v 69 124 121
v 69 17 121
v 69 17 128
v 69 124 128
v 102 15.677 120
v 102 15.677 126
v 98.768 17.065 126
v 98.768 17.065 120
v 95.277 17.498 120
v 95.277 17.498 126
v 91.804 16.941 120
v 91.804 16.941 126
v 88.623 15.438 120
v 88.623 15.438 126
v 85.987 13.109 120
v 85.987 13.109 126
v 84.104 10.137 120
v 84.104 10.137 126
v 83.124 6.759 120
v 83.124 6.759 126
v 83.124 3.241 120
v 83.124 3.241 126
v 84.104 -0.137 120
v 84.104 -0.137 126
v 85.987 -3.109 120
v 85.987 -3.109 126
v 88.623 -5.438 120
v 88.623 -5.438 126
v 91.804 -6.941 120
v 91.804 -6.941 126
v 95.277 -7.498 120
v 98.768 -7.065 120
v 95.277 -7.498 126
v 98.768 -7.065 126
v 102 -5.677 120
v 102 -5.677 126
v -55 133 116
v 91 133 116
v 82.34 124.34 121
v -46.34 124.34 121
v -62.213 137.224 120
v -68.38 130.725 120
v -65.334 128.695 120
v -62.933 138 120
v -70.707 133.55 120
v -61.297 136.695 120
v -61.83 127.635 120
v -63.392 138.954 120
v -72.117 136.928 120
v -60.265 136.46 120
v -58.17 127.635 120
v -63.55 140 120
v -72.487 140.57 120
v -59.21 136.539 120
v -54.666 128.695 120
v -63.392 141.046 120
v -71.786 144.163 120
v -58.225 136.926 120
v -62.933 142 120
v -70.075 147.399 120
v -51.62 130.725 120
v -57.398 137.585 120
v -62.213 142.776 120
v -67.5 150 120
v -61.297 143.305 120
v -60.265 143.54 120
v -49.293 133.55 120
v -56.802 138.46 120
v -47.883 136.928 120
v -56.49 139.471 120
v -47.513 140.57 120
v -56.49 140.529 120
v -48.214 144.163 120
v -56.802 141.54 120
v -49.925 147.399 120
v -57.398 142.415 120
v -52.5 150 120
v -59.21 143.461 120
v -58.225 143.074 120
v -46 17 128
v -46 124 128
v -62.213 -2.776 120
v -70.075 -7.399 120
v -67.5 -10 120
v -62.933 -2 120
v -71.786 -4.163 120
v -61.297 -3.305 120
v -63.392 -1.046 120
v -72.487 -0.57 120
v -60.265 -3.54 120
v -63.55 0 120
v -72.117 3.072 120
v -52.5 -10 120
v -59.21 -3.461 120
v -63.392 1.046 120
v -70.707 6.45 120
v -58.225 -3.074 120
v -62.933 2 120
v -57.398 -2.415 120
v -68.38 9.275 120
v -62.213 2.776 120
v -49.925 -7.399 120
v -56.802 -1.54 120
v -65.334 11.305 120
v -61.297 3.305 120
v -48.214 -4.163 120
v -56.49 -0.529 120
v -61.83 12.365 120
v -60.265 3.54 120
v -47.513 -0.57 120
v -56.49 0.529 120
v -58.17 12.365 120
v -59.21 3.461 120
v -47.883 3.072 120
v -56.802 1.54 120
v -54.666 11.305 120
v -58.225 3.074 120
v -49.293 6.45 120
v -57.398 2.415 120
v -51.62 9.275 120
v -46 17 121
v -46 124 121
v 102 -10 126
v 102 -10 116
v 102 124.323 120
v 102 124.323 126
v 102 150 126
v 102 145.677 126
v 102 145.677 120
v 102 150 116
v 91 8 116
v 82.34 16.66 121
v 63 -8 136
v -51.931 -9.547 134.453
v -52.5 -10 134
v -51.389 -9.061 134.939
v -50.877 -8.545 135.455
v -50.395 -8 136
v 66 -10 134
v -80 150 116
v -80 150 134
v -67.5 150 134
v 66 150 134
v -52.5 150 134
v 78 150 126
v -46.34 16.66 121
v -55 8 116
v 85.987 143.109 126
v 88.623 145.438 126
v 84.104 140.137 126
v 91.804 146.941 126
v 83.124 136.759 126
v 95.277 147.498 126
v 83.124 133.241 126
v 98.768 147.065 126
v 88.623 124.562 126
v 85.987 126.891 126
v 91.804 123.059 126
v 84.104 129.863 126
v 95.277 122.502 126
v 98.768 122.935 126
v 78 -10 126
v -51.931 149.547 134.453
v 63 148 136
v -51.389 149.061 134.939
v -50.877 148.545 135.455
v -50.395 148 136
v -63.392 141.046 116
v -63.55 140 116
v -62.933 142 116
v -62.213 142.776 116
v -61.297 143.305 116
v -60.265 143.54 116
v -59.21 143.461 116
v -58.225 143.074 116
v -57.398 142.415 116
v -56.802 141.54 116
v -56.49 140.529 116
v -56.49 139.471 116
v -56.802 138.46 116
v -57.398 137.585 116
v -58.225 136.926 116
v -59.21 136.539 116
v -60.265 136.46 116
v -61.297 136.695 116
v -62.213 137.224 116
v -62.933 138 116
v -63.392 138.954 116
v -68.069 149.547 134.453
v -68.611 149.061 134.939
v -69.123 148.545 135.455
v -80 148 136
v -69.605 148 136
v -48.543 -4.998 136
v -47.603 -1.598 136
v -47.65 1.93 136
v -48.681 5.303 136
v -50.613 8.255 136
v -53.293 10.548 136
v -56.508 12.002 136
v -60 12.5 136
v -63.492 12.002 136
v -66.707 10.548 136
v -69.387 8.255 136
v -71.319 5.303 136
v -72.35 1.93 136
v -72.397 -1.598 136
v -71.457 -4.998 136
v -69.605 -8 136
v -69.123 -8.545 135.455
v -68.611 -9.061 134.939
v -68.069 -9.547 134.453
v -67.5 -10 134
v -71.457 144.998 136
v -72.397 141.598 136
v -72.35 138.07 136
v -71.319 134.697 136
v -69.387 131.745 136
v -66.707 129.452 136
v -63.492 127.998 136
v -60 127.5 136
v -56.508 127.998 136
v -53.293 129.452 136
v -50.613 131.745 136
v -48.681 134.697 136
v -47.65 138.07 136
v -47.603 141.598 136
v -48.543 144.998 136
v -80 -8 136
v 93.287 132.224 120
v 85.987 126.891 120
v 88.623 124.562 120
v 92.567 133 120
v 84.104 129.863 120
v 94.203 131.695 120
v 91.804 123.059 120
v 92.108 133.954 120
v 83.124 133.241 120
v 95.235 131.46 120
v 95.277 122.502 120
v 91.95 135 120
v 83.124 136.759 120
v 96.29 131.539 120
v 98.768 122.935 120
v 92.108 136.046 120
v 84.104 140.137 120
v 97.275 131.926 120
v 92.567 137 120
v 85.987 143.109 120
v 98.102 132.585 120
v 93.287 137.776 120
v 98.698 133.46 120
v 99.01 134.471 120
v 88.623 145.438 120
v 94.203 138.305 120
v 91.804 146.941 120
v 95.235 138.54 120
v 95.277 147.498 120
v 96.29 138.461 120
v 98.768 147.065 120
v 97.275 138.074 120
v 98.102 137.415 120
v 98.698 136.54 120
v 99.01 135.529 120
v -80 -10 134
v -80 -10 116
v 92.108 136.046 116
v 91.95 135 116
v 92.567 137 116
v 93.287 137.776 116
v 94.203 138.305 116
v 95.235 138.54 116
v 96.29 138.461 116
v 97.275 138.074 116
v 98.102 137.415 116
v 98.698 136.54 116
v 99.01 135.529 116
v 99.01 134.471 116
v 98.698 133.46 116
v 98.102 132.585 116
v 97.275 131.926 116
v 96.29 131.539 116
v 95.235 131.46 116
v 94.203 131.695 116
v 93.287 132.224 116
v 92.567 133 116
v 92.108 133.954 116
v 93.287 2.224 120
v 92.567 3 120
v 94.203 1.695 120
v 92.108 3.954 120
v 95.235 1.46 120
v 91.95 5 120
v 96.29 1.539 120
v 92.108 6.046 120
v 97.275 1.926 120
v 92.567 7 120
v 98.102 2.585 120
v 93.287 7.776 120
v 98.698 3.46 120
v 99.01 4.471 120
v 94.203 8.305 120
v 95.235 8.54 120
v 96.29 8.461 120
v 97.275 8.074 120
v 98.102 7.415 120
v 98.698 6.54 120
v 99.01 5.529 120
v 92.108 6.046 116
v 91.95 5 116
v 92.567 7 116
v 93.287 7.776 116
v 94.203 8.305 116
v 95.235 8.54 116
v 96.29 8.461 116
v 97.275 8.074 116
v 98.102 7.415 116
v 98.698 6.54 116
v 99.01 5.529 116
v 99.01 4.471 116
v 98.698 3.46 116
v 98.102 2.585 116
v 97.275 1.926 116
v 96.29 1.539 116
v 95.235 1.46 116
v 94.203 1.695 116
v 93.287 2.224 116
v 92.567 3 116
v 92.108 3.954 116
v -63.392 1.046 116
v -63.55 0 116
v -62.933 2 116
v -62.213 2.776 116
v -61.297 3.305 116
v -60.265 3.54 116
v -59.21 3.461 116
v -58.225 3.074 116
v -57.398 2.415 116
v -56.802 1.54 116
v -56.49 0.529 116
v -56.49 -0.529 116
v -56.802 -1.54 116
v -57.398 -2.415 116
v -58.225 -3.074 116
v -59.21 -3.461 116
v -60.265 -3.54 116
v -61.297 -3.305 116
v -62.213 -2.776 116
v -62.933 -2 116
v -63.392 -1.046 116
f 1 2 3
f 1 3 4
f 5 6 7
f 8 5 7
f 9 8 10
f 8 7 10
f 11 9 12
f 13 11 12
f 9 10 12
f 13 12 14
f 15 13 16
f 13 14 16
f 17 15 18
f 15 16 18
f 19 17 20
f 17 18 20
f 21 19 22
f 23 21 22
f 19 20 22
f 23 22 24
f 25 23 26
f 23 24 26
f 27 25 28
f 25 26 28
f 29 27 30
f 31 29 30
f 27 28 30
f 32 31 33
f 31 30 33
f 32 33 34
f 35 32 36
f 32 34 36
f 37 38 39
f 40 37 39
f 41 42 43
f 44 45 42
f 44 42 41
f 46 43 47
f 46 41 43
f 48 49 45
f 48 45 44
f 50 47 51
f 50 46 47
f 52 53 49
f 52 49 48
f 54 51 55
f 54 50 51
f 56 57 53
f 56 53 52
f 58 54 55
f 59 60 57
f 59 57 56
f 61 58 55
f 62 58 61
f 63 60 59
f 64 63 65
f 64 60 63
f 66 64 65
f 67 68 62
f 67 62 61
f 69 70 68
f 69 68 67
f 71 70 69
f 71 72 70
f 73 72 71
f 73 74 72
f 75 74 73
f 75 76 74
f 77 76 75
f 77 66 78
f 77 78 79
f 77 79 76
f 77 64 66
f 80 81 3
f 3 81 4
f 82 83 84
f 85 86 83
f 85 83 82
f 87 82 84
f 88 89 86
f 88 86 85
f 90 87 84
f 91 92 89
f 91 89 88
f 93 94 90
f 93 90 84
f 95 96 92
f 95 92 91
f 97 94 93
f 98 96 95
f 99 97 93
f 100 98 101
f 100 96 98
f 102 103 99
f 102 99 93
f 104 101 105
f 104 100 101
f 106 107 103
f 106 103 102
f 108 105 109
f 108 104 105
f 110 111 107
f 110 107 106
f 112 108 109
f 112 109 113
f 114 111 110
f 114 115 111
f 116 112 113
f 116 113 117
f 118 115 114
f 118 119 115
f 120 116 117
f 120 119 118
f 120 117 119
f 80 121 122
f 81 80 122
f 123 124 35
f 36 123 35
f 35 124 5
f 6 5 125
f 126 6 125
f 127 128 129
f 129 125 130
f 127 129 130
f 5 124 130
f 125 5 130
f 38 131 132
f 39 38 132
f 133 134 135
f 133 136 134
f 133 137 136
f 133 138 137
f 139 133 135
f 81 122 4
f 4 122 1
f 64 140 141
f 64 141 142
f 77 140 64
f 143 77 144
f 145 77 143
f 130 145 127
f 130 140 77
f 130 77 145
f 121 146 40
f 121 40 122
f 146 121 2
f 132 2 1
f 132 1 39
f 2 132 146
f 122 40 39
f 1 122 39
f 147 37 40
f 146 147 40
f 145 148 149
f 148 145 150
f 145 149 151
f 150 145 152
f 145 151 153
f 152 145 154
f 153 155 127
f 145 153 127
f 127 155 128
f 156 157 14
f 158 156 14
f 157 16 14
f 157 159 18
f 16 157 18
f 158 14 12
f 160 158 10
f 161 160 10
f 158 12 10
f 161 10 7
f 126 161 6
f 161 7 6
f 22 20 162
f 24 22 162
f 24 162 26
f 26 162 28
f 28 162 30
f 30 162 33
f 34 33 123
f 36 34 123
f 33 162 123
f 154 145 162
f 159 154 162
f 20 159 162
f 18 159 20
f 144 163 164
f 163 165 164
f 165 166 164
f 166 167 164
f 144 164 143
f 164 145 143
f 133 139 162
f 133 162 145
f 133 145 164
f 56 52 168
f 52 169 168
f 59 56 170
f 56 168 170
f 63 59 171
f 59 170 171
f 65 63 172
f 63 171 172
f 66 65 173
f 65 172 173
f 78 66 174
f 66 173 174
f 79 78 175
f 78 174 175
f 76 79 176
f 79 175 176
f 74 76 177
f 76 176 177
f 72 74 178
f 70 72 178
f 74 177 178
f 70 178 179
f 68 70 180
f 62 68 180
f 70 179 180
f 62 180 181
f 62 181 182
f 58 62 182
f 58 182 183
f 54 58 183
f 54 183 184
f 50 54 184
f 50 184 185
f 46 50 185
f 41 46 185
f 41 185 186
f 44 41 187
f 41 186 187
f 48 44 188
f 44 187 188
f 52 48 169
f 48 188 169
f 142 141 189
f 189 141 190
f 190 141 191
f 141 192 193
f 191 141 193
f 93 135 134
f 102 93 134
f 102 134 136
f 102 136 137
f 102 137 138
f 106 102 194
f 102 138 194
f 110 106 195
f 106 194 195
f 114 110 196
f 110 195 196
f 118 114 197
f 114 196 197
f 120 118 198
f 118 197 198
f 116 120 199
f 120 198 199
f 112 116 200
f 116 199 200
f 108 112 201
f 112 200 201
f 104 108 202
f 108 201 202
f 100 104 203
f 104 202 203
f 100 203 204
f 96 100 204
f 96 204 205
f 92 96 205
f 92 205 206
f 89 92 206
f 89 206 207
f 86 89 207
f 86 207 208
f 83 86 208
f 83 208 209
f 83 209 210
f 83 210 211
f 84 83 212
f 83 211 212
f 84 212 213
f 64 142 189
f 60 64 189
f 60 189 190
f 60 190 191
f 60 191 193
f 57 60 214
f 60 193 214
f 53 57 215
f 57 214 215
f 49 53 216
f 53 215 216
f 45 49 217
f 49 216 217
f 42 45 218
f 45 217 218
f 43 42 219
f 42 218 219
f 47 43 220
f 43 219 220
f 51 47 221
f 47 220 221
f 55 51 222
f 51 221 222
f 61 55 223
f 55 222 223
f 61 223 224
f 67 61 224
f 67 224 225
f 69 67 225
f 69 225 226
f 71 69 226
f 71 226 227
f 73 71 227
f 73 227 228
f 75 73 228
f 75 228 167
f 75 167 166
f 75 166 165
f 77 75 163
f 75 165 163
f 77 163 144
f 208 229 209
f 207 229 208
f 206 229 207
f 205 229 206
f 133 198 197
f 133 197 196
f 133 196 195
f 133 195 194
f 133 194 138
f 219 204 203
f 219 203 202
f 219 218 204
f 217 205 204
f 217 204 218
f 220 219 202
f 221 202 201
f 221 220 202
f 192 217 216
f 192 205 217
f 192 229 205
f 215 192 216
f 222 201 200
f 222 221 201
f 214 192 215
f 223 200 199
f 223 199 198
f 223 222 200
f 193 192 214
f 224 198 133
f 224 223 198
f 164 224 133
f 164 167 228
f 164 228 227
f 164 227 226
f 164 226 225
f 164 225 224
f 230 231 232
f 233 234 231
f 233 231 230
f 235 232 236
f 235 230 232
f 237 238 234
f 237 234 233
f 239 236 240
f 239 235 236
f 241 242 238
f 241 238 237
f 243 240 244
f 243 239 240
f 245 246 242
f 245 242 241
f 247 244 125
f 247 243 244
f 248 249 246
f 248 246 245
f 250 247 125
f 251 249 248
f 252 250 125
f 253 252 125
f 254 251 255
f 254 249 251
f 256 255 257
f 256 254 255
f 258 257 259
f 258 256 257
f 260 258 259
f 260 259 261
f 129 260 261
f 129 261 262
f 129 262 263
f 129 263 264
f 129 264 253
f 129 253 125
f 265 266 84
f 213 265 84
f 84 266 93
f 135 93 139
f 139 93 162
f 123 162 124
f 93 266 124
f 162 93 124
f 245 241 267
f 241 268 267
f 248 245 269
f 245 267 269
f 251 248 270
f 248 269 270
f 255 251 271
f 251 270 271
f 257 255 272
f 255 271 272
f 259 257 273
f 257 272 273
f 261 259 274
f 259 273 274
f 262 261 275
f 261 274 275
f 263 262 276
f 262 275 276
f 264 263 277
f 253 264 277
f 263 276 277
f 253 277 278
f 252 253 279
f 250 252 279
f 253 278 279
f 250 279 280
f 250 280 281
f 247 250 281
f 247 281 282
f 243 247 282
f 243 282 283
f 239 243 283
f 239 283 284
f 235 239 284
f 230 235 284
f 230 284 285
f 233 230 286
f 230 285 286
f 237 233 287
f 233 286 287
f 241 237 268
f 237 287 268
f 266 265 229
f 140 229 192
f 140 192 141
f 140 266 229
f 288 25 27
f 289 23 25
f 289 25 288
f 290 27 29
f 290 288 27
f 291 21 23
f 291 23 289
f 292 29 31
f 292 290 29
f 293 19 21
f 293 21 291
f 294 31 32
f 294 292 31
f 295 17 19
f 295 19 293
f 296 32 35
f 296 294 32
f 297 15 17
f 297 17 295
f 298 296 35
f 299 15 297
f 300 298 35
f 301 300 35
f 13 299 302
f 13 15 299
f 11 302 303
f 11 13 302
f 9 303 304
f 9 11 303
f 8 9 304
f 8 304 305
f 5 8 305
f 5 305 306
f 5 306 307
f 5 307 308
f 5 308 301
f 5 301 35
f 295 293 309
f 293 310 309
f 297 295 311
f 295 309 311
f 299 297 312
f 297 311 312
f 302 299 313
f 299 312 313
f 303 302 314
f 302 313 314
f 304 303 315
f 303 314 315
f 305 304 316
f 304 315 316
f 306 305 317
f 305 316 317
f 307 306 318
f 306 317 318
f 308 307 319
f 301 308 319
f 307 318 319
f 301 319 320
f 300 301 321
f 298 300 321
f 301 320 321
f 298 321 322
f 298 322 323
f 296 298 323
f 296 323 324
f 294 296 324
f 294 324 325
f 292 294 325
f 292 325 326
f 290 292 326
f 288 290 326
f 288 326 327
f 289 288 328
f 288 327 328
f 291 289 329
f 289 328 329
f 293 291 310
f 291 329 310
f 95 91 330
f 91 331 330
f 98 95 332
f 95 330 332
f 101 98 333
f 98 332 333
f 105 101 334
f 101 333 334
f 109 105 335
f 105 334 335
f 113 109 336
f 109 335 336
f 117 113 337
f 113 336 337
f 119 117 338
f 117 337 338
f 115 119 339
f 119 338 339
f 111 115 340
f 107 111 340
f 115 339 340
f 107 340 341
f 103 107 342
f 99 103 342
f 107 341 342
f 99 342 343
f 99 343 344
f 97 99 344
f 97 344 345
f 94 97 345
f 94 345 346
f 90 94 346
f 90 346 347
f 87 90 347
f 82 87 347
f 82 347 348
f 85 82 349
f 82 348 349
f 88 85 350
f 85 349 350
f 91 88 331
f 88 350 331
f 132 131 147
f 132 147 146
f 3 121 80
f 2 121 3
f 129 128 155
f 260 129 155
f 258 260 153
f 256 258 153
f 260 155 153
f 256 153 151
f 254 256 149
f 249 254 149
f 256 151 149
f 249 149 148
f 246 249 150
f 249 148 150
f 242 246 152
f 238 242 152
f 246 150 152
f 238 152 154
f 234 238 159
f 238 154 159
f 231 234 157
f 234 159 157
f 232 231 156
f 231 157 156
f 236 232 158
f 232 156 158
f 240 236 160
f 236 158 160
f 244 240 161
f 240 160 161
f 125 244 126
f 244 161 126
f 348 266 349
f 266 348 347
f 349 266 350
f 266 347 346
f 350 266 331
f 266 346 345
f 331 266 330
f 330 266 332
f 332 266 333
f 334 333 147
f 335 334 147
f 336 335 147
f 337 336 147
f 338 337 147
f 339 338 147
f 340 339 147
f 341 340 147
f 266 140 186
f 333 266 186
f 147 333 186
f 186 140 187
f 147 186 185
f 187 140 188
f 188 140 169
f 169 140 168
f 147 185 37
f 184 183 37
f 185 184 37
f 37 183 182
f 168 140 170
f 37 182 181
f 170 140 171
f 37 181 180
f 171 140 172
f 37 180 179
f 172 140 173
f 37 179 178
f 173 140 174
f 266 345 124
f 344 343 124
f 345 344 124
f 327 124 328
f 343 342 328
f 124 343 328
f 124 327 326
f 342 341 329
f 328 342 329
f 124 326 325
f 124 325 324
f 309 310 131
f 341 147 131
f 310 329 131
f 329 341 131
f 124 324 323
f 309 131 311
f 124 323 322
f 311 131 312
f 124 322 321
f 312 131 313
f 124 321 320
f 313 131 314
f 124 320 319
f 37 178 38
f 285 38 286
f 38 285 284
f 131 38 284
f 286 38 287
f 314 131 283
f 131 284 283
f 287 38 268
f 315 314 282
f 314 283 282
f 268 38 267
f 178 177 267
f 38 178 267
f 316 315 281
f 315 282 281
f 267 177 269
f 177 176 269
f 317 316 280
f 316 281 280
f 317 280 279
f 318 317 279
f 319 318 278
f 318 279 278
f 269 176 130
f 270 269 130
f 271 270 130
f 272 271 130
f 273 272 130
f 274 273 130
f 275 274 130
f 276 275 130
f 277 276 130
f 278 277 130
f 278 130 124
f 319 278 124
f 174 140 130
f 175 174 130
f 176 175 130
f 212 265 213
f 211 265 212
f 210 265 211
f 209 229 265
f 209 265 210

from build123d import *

# Parameters (mm, degrees)
SKETCH012_W         = 182
SKETCH012_H         = 160
PAD006_DEPTH        = 20
HOLE005_D           = 7.1
HOLE005_DEPTH       = 25
HOLE005_CBORE_D     = 25
HOLE005_CBORE_DEPTH = 16
SKETCH020_W         = 146
SKETCH020_H         = 125
POCKET004_DEPTH     = 5
POCKET004_TAPER     = 60
CHAMFER001_SIZE     = 2
SKETCH025_W         = 115
SKETCH025_H         = 107
POCKET007_DEPTH     = 12
POCKET014_DEPTH     = 500


with BuildPart() as part:
    # Sketch012 → Pad006 (new body)
    with BuildSketch(Plane.XY):
        with Locations((91, 82)):
            Rectangle(SKETCH012_W, SKETCH012_H)
    extrude(amount=PAD006_DEPTH)

    # Hole005
    with Locations(Plane.XY.offset(20)):
        with Locations((20, 152), (20, 12), (175.5, 147), (175.5, 17)):
            CounterBoreHole(HOLE005_D / 2, HOLE005_CBORE_D / 2, HOLE005_CBORE_DEPTH, depth=HOLE005_DEPTH)

    # Sketch020 → Pocket004 (cut)
    with BuildSketch(Plane.XY):
        with Locations((98, 82.5)):
            Rectangle(SKETCH020_W, SKETCH020_H)
    extrude(amount=POCKET004_DEPTH, taper=POCKET004_TAPER, mode=Mode.SUBTRACT)

    # Chamfer001
    chamfer001_edges = [part.edges().sort_by_distance(p)[0] for p in [
        (104.75, 2, 20),
        (6.25, 2, 20),
        (6.25, 162, 20),
        (104.75, 162, 20),
    ]]
    chamfer(chamfer001_edges, length=CHAMFER001_SIZE)

    # Sketch025 → Pocket007 (cut)
    with BuildSketch(Plane.XY):
        with Locations((91.5, 82.5)):
            Rectangle(SKETCH025_W, SKETCH025_H)
    extrude(amount=POCKET007_DEPTH, mode=Mode.SUBTRACT)

    # Sketch032 → Pocket014 (cut)
    with BuildSketch(Plane.XZ):
        Polygon((140, 30), (190, 30), (190, 10), (170, 10), (160, 10), (158, 10), (140, 22), align=None)
    extrude(amount=-POCKET014_DEPTH, mode=Mode.SUBTRACT)


with BuildPart() as part_1:
    # Body004 placement: moved
    add(part.part.moved(Location((-80, -12, 116))))


solid = part_1.part
